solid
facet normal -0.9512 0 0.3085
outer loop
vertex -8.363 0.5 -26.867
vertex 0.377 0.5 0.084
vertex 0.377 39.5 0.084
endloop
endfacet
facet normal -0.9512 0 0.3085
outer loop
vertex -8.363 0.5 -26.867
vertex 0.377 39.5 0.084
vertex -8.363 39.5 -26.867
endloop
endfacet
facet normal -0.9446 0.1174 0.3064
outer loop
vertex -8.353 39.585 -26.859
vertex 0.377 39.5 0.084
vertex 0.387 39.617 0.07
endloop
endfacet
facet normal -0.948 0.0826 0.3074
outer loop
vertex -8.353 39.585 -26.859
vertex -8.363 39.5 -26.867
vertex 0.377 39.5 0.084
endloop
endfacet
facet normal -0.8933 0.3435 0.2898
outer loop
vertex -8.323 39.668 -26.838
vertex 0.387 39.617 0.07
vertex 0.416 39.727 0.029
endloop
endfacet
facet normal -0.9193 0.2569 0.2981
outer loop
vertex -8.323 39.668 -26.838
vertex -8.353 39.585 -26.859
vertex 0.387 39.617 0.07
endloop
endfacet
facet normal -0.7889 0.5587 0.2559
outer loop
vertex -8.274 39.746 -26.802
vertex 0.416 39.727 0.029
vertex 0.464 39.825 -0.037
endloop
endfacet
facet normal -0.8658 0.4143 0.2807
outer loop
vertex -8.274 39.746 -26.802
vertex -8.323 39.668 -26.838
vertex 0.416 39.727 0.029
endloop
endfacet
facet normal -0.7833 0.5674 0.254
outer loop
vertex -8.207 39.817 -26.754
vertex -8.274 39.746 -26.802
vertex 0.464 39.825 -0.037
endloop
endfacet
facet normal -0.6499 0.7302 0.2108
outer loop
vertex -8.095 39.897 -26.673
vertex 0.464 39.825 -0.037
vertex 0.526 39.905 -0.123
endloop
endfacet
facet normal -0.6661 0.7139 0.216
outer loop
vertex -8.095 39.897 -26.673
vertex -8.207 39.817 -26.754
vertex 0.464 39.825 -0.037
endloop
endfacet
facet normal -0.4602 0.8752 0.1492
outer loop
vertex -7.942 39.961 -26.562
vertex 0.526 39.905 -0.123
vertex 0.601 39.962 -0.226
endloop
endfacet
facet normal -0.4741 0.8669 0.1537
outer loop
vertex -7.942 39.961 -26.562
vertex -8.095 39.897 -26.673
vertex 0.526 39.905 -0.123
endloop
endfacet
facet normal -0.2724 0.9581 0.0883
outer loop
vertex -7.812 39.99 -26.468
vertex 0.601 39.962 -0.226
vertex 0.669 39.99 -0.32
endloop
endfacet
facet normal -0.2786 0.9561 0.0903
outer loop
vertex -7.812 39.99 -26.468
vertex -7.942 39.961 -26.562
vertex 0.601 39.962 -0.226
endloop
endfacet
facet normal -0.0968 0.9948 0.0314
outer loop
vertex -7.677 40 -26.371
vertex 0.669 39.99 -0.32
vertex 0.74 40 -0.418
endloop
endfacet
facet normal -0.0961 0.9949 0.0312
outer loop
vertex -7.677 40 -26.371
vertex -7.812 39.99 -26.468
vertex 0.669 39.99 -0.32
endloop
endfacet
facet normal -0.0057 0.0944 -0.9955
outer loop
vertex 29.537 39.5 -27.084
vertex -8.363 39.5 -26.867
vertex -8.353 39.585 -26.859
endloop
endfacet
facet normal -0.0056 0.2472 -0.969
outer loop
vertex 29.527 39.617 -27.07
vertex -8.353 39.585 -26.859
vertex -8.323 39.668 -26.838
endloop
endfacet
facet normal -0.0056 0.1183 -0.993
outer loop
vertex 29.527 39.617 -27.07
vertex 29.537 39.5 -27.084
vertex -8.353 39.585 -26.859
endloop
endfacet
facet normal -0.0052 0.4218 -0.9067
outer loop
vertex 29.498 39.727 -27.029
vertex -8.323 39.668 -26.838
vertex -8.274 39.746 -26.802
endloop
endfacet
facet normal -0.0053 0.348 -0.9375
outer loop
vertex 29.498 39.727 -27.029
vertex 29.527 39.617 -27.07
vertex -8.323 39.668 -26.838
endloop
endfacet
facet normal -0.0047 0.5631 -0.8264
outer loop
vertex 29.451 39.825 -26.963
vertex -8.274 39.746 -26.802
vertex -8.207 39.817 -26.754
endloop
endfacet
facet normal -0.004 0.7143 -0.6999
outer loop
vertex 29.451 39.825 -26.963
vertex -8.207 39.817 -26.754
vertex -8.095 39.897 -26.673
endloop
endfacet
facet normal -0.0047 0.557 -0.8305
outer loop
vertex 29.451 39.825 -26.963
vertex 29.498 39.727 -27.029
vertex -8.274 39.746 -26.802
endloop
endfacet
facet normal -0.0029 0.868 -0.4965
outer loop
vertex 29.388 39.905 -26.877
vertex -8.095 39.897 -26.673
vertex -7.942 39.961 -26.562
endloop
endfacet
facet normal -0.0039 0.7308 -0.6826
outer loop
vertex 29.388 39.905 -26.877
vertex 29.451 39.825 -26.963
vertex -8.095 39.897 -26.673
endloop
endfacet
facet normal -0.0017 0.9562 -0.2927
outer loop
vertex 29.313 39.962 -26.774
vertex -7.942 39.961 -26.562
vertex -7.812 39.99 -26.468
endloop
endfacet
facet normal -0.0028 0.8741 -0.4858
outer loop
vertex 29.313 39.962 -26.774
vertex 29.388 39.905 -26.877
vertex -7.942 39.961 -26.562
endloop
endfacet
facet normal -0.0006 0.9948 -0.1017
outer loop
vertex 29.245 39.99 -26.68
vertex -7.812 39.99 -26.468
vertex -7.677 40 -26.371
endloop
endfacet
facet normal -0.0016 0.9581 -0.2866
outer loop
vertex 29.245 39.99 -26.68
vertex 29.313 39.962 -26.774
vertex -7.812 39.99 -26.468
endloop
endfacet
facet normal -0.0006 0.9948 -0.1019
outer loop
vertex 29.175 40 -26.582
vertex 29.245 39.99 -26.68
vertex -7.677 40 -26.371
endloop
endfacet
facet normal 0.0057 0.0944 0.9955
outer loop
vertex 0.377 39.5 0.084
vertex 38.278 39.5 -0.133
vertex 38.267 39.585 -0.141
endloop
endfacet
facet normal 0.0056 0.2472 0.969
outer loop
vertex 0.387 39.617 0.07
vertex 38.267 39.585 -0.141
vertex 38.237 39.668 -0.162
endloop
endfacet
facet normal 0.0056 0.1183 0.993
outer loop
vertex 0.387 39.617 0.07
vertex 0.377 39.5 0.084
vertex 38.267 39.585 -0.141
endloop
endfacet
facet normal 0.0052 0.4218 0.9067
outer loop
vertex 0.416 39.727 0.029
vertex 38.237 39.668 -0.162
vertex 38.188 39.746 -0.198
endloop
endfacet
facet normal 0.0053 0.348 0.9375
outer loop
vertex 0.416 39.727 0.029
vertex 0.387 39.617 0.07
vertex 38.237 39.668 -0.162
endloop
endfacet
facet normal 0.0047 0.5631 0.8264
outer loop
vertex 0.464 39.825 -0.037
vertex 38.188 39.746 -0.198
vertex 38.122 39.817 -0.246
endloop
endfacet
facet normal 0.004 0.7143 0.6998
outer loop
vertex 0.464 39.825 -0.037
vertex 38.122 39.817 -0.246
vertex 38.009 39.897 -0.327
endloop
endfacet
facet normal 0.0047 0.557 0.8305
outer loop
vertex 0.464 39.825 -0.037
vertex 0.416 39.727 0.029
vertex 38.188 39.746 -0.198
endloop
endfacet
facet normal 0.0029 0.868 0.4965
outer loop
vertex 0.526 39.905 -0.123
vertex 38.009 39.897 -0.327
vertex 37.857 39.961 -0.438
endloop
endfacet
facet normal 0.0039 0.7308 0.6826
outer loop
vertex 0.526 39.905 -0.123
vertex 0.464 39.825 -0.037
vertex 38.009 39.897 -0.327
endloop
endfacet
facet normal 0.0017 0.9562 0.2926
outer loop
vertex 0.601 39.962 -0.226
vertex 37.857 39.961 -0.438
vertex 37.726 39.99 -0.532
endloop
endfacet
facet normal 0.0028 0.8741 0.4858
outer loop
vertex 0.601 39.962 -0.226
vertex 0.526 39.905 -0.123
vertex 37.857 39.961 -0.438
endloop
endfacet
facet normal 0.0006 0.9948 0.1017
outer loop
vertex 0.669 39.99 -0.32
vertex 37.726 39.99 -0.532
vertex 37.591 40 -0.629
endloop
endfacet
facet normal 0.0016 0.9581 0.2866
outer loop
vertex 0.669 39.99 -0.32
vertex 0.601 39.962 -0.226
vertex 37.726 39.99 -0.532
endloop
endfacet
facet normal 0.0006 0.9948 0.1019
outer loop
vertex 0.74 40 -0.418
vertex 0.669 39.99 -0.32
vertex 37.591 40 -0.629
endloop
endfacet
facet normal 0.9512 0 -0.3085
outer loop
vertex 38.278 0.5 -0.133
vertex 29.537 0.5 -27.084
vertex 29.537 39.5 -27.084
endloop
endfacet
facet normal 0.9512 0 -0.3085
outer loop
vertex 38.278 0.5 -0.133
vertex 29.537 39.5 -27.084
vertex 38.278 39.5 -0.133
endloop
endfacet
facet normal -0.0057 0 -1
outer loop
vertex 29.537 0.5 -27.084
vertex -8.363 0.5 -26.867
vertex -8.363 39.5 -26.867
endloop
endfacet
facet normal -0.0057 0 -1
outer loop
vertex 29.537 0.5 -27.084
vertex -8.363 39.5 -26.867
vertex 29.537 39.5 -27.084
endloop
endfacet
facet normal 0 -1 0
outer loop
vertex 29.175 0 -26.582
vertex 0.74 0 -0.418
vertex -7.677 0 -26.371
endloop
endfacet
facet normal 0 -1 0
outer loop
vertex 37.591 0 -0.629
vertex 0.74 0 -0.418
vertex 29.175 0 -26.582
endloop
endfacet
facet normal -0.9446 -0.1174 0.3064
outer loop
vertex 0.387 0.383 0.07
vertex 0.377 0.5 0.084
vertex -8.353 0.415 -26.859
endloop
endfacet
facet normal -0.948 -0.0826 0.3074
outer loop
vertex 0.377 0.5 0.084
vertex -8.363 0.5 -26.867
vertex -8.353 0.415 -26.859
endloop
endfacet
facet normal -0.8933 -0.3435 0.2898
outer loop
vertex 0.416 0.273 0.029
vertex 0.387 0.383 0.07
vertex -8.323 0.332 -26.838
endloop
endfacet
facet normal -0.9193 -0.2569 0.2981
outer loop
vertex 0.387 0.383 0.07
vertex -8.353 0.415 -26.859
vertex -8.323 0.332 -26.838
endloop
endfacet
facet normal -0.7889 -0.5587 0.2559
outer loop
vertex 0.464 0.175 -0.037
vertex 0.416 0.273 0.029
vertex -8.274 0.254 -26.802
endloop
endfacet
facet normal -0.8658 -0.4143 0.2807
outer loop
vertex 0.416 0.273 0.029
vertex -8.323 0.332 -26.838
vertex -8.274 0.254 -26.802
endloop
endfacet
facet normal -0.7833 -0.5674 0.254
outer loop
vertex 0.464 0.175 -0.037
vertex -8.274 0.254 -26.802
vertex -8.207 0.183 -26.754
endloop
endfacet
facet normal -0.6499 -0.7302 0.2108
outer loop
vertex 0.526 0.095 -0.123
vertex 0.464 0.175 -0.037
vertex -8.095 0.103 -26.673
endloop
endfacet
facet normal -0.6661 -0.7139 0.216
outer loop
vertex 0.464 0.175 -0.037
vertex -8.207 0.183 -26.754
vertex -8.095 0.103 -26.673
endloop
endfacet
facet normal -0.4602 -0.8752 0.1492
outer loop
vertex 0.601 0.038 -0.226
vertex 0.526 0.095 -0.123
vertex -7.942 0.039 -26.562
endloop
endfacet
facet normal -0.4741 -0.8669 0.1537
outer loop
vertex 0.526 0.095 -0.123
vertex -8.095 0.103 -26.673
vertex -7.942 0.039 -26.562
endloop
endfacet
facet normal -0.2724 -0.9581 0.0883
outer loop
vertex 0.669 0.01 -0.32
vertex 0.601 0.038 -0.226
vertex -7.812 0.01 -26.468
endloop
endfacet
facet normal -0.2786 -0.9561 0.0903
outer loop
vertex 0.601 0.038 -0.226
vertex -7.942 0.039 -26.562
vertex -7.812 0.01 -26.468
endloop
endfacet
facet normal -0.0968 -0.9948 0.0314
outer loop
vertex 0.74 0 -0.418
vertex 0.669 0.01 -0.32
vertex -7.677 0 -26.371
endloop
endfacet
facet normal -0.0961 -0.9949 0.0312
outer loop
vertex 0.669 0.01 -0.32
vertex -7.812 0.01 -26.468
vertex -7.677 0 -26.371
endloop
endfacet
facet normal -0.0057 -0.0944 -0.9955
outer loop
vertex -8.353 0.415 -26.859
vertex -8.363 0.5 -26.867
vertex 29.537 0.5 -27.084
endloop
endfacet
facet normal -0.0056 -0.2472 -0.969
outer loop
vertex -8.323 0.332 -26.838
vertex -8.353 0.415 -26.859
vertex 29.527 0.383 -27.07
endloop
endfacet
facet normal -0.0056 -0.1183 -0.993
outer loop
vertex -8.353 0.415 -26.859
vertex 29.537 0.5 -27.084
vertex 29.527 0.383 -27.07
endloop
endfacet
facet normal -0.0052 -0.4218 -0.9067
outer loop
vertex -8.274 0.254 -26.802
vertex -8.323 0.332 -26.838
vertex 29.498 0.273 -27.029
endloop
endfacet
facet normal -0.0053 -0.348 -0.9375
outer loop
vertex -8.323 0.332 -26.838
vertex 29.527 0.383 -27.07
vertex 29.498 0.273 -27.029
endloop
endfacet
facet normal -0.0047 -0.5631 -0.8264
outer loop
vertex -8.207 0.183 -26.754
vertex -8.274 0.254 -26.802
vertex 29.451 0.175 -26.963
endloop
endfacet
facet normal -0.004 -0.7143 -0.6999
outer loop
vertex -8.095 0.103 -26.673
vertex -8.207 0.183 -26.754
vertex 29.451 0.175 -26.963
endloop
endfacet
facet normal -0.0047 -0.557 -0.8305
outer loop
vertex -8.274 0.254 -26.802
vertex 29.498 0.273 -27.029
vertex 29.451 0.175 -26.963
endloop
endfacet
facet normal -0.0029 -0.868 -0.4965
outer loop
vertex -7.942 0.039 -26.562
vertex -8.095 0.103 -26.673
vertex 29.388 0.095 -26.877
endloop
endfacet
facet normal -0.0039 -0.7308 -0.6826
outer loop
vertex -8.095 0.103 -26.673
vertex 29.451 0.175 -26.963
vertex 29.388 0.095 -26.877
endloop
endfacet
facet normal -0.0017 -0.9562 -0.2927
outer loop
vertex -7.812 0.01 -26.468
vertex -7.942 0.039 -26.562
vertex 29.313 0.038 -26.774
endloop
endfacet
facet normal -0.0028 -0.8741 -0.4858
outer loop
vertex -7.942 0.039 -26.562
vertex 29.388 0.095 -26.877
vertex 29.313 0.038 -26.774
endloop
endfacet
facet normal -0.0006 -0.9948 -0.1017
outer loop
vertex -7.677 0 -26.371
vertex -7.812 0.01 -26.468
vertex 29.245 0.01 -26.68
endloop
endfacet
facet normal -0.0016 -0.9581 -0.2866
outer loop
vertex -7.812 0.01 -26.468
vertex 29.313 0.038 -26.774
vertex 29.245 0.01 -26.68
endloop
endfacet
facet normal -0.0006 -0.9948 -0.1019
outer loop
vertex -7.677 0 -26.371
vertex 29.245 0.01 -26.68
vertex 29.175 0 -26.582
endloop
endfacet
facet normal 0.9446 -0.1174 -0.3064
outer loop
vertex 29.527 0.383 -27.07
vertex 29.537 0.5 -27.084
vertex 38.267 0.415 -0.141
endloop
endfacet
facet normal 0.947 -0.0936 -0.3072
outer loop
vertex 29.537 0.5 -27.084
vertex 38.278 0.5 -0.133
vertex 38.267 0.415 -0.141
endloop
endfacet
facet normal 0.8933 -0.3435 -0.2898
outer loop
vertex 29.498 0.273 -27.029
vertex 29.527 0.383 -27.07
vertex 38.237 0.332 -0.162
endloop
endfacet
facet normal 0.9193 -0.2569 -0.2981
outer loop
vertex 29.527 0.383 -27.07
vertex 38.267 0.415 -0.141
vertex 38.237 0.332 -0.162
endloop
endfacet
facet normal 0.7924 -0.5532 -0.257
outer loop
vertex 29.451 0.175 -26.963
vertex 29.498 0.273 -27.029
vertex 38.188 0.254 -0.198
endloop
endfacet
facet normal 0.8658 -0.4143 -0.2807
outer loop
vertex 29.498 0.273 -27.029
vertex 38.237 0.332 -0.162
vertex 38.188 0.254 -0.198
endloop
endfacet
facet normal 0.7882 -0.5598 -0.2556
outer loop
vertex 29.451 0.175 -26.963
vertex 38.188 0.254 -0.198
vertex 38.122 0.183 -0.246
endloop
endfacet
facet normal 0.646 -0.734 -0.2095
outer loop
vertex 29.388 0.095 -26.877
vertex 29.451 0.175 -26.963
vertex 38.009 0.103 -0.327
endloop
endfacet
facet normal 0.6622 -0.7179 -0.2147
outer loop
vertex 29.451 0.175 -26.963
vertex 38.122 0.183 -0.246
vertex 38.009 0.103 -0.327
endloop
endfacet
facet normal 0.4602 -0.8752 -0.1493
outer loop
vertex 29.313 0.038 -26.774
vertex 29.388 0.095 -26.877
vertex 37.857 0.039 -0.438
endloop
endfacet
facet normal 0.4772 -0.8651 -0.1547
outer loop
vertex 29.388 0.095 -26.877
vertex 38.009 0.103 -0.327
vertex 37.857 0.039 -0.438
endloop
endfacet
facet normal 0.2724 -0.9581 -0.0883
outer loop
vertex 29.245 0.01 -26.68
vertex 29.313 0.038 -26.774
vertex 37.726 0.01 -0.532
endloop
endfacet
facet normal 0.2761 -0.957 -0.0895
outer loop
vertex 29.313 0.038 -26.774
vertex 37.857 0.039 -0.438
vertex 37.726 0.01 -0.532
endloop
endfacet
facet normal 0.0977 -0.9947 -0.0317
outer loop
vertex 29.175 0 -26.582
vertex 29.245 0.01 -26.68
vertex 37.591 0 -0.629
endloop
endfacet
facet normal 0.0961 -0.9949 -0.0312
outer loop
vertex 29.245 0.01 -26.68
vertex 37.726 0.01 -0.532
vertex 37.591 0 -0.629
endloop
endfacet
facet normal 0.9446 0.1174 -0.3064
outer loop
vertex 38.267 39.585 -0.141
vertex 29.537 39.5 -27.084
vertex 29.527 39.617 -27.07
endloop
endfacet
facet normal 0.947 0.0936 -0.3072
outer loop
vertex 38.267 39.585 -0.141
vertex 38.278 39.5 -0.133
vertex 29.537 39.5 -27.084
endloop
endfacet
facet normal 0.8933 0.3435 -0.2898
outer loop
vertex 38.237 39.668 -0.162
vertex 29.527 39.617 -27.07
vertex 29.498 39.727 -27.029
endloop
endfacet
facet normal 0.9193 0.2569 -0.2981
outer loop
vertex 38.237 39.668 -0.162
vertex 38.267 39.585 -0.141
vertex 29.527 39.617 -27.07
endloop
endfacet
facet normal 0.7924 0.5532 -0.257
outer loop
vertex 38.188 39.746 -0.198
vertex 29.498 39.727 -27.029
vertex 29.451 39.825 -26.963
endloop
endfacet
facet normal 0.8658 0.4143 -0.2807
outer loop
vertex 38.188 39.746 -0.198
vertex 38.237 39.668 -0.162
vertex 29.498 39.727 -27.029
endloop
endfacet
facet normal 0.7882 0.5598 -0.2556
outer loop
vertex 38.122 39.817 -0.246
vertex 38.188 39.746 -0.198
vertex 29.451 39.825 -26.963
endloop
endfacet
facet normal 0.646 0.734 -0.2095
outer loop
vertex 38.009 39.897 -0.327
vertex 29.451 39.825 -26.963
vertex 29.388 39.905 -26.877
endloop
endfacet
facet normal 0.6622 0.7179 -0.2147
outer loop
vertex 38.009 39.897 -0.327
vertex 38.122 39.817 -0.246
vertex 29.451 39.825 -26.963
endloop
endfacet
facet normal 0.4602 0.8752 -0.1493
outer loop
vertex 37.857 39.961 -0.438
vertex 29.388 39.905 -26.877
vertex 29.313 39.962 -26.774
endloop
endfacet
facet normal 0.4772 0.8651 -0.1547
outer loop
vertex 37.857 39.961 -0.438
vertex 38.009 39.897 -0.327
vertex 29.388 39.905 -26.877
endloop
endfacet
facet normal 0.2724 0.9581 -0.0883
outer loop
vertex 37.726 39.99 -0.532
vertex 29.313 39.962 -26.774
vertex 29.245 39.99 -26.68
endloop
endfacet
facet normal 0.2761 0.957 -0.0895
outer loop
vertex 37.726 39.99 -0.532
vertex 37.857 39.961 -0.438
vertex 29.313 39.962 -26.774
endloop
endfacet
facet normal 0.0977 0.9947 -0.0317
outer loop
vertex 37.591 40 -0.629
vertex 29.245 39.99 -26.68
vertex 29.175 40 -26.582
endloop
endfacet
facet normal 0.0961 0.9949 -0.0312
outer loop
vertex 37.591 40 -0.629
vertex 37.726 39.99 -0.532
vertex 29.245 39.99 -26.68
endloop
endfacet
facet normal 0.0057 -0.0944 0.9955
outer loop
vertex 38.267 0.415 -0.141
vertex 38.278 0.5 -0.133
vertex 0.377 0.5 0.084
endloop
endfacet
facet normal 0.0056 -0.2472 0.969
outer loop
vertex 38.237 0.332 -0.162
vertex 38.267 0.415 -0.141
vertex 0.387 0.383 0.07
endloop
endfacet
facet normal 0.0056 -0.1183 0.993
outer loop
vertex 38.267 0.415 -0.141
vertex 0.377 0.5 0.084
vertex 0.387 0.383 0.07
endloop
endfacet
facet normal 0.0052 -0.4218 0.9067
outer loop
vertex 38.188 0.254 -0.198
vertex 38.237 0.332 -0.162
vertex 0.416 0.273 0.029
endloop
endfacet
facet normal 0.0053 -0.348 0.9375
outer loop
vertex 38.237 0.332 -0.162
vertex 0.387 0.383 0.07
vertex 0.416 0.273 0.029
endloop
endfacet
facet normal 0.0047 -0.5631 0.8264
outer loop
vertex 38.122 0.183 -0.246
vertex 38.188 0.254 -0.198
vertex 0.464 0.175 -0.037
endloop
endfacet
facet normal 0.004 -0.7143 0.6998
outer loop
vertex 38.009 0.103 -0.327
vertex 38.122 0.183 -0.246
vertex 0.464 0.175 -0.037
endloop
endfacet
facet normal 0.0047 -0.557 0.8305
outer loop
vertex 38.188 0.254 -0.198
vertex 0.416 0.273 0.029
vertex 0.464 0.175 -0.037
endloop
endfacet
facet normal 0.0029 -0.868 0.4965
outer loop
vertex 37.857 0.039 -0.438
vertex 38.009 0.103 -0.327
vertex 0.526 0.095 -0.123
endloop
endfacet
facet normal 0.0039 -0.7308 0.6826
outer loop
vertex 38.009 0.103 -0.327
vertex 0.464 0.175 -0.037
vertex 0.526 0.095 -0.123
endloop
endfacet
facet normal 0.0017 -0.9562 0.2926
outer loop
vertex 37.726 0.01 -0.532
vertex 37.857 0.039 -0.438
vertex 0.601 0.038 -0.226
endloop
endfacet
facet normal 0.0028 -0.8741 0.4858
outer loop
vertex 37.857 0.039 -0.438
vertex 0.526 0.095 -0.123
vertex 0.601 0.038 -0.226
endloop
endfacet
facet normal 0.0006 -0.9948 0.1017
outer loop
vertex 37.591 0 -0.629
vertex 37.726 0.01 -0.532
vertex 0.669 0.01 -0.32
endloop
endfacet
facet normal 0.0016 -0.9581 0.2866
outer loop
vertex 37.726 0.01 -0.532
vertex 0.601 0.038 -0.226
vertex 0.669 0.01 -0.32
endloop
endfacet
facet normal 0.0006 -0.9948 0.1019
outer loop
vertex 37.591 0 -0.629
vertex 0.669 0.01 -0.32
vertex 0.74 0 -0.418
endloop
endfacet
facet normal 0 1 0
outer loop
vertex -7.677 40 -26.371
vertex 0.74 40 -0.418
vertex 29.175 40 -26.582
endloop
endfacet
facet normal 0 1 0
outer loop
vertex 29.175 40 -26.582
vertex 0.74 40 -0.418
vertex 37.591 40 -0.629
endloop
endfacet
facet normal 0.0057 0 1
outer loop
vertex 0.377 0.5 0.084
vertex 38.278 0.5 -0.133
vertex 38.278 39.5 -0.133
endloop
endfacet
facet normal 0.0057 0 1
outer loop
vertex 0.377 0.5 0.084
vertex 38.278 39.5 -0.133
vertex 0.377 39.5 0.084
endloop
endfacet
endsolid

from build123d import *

# Parameters (mm, degrees)
BOSS_EXTRUDE1_DEPTH = 40
FILLET1_R           = 0.5


with BuildPart() as part:
    # Sketch1 → Boss-Extrude1 (new body)
    with BuildSketch(Plane(origin=(0, 0, 0), x_dir=(-1, 0, 0), z_dir=(0, 1, 0))):
        Polygon((-0.376890979, 0.083720177), (8.363244284, -26.866668495), (-29.537452899, -27.083722916), (-38.277588162, -0.133334243), align=None)
    extrude(amount=BOSS_EXTRUDE1_DEPTH)

    # Fillet1
    fillet1_edges = [part.edges().sort_by_distance(p)[0] for p in [
        (10.587104308, 40, -26.975195705),
        (-3.993176653, 40, -13.391474159),
        (19.32723957, 40, -0.024807033),
        (-3.993176653, 0, -13.391474159),
        (10.587104308, 0, -26.975195705),
        (33.907520531, 0, -13.608528579),
        (19.32723957, 0, -0.024807033),
        (33.907520531, 40, -13.608528579),
    ]]
    fillet(fillet1_edges, radius=FILLET1_R)


solid = part.part
